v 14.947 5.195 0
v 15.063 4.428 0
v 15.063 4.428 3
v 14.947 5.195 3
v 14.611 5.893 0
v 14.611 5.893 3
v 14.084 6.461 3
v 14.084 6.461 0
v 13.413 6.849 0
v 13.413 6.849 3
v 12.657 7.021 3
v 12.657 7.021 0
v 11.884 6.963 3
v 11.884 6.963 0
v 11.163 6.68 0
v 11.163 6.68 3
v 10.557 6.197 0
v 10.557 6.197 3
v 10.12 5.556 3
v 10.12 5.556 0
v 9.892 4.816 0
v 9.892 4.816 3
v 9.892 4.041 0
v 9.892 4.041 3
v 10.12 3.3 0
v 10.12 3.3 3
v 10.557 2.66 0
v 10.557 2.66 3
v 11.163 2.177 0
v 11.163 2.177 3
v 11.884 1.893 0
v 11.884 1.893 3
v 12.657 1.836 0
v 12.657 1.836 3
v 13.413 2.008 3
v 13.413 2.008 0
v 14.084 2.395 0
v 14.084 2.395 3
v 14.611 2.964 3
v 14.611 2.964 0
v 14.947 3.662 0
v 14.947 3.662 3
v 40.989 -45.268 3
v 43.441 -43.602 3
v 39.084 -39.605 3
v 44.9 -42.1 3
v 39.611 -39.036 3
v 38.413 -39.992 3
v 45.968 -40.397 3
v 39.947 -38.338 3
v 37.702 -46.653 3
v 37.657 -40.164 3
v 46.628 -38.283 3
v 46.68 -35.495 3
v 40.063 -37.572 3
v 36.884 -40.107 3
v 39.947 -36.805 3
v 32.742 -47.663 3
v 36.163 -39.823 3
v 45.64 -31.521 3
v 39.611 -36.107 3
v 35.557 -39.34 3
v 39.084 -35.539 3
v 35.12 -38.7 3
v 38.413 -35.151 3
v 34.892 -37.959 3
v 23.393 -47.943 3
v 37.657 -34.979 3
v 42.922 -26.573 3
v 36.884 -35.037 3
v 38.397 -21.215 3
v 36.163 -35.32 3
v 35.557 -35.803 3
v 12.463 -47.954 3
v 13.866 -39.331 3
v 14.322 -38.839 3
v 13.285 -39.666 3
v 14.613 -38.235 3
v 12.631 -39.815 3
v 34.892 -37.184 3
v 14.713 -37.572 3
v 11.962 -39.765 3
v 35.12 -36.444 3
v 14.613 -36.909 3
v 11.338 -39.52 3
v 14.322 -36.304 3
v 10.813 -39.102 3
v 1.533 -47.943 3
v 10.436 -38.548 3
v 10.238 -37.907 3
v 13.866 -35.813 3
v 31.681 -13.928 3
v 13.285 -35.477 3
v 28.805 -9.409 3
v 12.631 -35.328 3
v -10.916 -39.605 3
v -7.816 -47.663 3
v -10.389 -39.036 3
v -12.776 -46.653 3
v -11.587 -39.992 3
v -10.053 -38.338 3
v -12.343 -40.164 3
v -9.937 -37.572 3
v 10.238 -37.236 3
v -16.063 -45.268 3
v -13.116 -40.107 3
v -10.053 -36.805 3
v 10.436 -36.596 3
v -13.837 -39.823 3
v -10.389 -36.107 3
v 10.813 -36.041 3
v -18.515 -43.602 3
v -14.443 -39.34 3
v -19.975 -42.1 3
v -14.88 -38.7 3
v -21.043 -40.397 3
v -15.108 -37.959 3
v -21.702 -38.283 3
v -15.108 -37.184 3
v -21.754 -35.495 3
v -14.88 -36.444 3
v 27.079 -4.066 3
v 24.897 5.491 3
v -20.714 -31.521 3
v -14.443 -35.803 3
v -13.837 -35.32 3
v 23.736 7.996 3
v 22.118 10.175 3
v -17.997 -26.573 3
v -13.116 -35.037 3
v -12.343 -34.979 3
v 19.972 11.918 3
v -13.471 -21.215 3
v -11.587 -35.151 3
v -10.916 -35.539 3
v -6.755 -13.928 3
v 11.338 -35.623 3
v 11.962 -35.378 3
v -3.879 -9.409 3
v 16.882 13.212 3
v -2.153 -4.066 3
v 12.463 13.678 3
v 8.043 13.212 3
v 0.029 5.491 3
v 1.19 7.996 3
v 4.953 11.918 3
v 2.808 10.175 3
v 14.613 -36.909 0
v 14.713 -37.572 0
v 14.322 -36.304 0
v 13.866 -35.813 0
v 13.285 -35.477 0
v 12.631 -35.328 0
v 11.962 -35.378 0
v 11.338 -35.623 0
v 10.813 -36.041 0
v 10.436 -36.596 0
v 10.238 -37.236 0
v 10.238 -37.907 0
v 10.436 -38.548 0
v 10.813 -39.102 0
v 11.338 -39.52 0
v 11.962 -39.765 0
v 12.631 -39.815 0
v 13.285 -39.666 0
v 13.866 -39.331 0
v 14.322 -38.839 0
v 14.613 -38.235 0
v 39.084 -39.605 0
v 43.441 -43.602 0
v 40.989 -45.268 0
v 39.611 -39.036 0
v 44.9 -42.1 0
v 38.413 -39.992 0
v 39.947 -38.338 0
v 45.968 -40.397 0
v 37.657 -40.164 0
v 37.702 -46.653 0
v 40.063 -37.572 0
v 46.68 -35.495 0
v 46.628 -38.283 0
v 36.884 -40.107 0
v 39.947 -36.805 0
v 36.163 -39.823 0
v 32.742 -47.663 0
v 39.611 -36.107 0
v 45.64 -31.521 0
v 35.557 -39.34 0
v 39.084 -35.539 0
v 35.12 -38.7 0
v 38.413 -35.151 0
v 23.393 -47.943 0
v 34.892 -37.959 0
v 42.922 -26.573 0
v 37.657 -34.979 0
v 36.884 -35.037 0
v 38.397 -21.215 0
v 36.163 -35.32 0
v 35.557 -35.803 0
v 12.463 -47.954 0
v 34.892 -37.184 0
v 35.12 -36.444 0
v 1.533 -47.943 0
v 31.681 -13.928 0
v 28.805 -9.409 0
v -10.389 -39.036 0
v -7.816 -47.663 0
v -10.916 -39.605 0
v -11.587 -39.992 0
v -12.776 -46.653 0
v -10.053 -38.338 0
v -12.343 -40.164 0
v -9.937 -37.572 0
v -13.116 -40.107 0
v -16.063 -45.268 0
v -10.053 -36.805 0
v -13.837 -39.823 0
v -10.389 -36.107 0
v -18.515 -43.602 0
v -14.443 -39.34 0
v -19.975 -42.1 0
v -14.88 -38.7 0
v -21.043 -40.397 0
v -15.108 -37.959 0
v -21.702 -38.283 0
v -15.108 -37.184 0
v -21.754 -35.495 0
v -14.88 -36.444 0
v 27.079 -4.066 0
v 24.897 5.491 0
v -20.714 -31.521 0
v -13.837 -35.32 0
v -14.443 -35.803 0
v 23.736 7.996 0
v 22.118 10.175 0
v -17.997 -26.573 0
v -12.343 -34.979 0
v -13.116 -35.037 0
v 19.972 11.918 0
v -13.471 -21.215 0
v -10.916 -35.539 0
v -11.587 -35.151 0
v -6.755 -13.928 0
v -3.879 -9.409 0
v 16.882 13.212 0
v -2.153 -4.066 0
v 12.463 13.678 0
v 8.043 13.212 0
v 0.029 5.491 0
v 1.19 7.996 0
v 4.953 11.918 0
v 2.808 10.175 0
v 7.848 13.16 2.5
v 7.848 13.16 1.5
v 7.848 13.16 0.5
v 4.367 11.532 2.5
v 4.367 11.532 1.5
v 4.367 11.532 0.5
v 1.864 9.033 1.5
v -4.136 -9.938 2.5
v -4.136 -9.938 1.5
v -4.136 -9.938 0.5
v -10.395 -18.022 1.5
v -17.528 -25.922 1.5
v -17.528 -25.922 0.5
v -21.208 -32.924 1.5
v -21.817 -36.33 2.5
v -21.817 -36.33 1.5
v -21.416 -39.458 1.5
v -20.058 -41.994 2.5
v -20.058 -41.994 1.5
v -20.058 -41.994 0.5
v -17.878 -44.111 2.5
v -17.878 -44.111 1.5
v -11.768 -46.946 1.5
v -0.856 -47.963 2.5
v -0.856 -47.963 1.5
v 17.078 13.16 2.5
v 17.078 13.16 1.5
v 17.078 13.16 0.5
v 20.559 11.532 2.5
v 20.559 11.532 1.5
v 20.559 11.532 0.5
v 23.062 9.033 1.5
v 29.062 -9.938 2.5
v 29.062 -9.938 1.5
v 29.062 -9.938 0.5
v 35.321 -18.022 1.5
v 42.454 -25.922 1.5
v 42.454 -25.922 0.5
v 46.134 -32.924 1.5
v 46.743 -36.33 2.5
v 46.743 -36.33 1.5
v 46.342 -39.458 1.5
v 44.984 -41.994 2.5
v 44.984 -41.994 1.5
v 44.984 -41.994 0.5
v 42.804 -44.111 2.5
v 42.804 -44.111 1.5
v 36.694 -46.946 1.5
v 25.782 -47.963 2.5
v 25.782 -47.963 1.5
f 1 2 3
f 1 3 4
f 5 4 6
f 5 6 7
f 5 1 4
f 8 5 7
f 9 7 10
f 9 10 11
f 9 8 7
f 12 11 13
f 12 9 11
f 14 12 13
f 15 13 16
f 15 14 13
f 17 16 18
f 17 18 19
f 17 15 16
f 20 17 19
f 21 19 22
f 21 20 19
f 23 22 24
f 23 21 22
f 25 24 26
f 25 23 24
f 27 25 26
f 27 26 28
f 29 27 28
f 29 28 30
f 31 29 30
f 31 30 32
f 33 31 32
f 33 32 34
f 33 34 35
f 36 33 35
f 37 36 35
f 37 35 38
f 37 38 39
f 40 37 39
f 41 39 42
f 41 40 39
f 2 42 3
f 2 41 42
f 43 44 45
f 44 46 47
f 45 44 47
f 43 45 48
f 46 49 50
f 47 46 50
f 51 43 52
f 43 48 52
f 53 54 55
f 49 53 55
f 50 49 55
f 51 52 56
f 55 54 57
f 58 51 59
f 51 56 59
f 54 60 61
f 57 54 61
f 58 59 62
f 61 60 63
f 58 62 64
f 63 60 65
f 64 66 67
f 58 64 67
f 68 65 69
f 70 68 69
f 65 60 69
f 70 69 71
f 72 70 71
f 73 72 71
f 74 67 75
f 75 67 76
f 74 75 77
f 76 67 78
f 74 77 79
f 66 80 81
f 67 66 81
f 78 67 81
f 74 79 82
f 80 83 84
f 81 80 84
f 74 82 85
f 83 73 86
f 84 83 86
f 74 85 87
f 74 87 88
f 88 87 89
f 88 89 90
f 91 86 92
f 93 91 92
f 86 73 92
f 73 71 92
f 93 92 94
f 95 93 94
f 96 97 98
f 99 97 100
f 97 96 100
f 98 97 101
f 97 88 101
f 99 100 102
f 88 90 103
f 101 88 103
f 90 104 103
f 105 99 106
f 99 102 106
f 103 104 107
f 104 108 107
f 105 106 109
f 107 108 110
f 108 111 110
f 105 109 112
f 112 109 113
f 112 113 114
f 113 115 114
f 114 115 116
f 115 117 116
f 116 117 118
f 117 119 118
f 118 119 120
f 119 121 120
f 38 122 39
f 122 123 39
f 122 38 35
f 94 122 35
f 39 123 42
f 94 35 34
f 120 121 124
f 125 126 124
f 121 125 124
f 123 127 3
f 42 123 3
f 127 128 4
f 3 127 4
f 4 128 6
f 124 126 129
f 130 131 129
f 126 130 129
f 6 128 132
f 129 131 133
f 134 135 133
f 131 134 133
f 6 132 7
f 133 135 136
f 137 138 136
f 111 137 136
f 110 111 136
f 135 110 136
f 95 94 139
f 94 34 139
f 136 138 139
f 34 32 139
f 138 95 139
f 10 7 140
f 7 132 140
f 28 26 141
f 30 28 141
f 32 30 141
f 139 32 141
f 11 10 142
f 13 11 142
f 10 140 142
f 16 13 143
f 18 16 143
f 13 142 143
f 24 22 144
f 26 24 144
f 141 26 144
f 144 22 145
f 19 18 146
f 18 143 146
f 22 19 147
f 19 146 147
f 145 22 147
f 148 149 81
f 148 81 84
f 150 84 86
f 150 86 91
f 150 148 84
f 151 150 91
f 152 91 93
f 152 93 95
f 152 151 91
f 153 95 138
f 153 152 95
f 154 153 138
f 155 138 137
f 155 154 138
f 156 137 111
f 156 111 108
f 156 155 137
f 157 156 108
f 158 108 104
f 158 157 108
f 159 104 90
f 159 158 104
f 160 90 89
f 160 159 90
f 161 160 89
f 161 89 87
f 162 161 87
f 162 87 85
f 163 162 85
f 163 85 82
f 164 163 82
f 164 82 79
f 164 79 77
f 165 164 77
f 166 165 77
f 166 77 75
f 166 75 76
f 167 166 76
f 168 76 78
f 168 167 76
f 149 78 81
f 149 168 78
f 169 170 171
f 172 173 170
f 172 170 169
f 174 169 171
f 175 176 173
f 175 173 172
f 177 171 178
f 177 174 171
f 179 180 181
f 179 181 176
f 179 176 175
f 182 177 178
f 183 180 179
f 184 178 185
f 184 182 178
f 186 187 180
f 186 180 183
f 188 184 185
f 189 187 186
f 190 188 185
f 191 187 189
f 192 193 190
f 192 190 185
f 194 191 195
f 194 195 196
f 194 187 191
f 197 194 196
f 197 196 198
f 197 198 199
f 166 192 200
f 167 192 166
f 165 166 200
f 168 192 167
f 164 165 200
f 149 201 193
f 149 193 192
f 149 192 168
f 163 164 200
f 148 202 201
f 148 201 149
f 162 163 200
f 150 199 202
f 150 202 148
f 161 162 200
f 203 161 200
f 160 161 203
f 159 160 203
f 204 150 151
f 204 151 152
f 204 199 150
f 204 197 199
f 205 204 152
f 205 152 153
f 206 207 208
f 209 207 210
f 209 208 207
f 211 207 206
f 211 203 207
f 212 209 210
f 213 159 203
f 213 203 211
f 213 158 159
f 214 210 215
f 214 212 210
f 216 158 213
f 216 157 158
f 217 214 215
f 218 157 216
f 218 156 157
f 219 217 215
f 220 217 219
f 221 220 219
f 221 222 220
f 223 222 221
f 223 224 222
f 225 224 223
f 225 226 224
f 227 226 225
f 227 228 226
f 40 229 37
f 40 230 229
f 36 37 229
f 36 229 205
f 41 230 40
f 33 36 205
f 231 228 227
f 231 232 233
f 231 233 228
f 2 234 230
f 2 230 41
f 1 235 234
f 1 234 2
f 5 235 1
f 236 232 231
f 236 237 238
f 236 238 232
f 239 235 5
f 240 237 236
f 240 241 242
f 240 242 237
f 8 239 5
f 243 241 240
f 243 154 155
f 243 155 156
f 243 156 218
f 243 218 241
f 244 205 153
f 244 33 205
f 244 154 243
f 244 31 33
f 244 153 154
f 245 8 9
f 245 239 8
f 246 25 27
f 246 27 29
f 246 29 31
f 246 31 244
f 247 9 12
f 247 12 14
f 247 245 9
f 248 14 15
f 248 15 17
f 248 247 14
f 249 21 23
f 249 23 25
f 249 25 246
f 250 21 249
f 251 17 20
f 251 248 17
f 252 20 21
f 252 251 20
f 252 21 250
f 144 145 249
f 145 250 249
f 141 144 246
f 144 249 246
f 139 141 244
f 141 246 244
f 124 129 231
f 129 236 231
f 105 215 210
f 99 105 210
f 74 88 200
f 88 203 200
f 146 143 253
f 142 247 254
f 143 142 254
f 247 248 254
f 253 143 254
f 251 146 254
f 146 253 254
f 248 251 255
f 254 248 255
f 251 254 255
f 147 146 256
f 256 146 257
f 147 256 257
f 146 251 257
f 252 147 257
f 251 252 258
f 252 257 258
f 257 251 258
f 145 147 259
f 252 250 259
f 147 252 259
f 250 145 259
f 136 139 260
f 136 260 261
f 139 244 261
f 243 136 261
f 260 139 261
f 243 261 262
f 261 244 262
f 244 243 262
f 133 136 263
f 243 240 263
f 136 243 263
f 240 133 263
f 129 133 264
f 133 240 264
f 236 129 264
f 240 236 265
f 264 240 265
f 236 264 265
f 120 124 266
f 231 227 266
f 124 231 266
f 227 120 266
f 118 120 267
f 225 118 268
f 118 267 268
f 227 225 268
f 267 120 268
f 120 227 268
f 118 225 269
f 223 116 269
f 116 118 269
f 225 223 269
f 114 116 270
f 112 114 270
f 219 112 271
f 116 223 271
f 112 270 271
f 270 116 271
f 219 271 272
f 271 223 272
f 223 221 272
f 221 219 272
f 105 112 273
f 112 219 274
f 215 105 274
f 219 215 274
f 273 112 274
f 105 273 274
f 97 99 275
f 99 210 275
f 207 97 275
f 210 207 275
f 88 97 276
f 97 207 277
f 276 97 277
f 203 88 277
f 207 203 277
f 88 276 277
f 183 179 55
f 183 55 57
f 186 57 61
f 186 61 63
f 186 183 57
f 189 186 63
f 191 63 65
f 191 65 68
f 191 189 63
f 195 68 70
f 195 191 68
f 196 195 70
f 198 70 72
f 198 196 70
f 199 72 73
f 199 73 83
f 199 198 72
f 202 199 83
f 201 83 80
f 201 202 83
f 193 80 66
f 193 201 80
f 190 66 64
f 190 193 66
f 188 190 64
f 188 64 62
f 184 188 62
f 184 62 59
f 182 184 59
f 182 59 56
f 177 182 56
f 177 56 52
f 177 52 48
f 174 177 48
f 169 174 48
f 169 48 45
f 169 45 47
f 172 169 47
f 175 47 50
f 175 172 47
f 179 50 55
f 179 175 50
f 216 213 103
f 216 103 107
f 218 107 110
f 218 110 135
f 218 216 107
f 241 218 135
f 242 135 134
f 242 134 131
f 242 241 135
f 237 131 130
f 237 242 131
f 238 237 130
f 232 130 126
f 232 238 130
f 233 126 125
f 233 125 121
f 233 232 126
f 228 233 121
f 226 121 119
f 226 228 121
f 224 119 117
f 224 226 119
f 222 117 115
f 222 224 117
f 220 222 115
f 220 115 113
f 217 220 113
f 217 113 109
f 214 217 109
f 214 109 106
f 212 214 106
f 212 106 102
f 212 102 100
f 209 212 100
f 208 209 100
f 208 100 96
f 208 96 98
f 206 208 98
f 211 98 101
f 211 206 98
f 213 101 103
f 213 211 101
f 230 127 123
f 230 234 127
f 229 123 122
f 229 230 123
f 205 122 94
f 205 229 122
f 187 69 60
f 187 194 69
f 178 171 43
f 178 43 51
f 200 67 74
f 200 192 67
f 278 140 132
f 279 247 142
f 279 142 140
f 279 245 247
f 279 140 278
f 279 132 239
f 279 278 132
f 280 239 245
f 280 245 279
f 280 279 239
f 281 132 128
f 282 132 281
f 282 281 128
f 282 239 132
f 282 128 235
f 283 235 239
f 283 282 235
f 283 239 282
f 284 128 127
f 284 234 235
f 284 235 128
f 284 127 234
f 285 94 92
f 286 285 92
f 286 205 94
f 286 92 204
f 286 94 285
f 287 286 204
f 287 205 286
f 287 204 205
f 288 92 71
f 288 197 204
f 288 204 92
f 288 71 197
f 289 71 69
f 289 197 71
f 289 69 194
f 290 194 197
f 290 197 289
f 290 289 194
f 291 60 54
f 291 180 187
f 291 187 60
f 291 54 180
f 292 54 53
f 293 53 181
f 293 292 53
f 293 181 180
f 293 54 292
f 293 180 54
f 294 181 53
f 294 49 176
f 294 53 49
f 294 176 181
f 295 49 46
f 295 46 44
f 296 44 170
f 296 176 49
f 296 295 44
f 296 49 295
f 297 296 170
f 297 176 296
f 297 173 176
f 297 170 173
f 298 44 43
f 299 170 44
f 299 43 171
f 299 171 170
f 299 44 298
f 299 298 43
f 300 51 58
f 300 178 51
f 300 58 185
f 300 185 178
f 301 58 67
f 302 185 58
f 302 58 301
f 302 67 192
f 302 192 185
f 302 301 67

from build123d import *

# Parameters (mm, degrees)
F0_R     = 2.6
F0_R_2   = 2.25
F1_DEPTH = 3


with BuildPart() as f1:
    # F0 (on Top) → F1 (new body)
    with BuildSketch(Plane.XY):
        with BuildLine():
            add(Edge.make_bspline(
                [(12.4628519006, 13.6780394241), (19.4407593717, 13.8331027583), (26.7452298575, 6.7324317401), (26.3128940789, -11.5322055726), (43.6181419579, -24.266116276), (49.2919868937, -40.2839782528), (35.8826429609, -49.4228751578), (22.1731135653, -47.6006929448), (12.4628519006, -47.95422405)],
                knots=[0, 0, 0, 0, 0.1549555961, 0.3196507615, 0.5052578789, 0.6577917534, 0.7998356316, 1, 1, 1, 1], degree=3))
            add(Edge.make_bspline(
                [(12.4628519006, 13.6780394241), (5.4849444295, 13.8331027583), (-1.8195260563, 6.7324317401), (-1.3871902777, -11.5322055726), (-18.6924381567, -24.266116276), (-24.3662830925, -40.2839782528), (-10.9569391597, -49.4228751578), (2.7525902359, -47.6006929448), (12.4628519006, -47.95422405)],
                knots=[0, 0, 0, 0, 0.1549555961, 0.3196507615, 0.5052578789, 0.6577917534, 0.7998356316, 1, 1, 1, 1], degree=3))
        make_face()
        with Locations((-12.5371480994, -37.5717511536)):
            Circle(F0_R, mode=Mode.SUBTRACT)
        with Locations((12.4628519006, -37.5717511536)):
            Circle(F0_R_2, mode=Mode.SUBTRACT)
        with Locations((37.4628519006, -37.5717511536)):
            Circle(F0_R, mode=Mode.SUBTRACT)
        with Locations((12.4628519006, 4.4282488464)):
            Circle(F0_R, mode=Mode.SUBTRACT)
    extrude(amount=F1_DEPTH)


solid = f1.part
